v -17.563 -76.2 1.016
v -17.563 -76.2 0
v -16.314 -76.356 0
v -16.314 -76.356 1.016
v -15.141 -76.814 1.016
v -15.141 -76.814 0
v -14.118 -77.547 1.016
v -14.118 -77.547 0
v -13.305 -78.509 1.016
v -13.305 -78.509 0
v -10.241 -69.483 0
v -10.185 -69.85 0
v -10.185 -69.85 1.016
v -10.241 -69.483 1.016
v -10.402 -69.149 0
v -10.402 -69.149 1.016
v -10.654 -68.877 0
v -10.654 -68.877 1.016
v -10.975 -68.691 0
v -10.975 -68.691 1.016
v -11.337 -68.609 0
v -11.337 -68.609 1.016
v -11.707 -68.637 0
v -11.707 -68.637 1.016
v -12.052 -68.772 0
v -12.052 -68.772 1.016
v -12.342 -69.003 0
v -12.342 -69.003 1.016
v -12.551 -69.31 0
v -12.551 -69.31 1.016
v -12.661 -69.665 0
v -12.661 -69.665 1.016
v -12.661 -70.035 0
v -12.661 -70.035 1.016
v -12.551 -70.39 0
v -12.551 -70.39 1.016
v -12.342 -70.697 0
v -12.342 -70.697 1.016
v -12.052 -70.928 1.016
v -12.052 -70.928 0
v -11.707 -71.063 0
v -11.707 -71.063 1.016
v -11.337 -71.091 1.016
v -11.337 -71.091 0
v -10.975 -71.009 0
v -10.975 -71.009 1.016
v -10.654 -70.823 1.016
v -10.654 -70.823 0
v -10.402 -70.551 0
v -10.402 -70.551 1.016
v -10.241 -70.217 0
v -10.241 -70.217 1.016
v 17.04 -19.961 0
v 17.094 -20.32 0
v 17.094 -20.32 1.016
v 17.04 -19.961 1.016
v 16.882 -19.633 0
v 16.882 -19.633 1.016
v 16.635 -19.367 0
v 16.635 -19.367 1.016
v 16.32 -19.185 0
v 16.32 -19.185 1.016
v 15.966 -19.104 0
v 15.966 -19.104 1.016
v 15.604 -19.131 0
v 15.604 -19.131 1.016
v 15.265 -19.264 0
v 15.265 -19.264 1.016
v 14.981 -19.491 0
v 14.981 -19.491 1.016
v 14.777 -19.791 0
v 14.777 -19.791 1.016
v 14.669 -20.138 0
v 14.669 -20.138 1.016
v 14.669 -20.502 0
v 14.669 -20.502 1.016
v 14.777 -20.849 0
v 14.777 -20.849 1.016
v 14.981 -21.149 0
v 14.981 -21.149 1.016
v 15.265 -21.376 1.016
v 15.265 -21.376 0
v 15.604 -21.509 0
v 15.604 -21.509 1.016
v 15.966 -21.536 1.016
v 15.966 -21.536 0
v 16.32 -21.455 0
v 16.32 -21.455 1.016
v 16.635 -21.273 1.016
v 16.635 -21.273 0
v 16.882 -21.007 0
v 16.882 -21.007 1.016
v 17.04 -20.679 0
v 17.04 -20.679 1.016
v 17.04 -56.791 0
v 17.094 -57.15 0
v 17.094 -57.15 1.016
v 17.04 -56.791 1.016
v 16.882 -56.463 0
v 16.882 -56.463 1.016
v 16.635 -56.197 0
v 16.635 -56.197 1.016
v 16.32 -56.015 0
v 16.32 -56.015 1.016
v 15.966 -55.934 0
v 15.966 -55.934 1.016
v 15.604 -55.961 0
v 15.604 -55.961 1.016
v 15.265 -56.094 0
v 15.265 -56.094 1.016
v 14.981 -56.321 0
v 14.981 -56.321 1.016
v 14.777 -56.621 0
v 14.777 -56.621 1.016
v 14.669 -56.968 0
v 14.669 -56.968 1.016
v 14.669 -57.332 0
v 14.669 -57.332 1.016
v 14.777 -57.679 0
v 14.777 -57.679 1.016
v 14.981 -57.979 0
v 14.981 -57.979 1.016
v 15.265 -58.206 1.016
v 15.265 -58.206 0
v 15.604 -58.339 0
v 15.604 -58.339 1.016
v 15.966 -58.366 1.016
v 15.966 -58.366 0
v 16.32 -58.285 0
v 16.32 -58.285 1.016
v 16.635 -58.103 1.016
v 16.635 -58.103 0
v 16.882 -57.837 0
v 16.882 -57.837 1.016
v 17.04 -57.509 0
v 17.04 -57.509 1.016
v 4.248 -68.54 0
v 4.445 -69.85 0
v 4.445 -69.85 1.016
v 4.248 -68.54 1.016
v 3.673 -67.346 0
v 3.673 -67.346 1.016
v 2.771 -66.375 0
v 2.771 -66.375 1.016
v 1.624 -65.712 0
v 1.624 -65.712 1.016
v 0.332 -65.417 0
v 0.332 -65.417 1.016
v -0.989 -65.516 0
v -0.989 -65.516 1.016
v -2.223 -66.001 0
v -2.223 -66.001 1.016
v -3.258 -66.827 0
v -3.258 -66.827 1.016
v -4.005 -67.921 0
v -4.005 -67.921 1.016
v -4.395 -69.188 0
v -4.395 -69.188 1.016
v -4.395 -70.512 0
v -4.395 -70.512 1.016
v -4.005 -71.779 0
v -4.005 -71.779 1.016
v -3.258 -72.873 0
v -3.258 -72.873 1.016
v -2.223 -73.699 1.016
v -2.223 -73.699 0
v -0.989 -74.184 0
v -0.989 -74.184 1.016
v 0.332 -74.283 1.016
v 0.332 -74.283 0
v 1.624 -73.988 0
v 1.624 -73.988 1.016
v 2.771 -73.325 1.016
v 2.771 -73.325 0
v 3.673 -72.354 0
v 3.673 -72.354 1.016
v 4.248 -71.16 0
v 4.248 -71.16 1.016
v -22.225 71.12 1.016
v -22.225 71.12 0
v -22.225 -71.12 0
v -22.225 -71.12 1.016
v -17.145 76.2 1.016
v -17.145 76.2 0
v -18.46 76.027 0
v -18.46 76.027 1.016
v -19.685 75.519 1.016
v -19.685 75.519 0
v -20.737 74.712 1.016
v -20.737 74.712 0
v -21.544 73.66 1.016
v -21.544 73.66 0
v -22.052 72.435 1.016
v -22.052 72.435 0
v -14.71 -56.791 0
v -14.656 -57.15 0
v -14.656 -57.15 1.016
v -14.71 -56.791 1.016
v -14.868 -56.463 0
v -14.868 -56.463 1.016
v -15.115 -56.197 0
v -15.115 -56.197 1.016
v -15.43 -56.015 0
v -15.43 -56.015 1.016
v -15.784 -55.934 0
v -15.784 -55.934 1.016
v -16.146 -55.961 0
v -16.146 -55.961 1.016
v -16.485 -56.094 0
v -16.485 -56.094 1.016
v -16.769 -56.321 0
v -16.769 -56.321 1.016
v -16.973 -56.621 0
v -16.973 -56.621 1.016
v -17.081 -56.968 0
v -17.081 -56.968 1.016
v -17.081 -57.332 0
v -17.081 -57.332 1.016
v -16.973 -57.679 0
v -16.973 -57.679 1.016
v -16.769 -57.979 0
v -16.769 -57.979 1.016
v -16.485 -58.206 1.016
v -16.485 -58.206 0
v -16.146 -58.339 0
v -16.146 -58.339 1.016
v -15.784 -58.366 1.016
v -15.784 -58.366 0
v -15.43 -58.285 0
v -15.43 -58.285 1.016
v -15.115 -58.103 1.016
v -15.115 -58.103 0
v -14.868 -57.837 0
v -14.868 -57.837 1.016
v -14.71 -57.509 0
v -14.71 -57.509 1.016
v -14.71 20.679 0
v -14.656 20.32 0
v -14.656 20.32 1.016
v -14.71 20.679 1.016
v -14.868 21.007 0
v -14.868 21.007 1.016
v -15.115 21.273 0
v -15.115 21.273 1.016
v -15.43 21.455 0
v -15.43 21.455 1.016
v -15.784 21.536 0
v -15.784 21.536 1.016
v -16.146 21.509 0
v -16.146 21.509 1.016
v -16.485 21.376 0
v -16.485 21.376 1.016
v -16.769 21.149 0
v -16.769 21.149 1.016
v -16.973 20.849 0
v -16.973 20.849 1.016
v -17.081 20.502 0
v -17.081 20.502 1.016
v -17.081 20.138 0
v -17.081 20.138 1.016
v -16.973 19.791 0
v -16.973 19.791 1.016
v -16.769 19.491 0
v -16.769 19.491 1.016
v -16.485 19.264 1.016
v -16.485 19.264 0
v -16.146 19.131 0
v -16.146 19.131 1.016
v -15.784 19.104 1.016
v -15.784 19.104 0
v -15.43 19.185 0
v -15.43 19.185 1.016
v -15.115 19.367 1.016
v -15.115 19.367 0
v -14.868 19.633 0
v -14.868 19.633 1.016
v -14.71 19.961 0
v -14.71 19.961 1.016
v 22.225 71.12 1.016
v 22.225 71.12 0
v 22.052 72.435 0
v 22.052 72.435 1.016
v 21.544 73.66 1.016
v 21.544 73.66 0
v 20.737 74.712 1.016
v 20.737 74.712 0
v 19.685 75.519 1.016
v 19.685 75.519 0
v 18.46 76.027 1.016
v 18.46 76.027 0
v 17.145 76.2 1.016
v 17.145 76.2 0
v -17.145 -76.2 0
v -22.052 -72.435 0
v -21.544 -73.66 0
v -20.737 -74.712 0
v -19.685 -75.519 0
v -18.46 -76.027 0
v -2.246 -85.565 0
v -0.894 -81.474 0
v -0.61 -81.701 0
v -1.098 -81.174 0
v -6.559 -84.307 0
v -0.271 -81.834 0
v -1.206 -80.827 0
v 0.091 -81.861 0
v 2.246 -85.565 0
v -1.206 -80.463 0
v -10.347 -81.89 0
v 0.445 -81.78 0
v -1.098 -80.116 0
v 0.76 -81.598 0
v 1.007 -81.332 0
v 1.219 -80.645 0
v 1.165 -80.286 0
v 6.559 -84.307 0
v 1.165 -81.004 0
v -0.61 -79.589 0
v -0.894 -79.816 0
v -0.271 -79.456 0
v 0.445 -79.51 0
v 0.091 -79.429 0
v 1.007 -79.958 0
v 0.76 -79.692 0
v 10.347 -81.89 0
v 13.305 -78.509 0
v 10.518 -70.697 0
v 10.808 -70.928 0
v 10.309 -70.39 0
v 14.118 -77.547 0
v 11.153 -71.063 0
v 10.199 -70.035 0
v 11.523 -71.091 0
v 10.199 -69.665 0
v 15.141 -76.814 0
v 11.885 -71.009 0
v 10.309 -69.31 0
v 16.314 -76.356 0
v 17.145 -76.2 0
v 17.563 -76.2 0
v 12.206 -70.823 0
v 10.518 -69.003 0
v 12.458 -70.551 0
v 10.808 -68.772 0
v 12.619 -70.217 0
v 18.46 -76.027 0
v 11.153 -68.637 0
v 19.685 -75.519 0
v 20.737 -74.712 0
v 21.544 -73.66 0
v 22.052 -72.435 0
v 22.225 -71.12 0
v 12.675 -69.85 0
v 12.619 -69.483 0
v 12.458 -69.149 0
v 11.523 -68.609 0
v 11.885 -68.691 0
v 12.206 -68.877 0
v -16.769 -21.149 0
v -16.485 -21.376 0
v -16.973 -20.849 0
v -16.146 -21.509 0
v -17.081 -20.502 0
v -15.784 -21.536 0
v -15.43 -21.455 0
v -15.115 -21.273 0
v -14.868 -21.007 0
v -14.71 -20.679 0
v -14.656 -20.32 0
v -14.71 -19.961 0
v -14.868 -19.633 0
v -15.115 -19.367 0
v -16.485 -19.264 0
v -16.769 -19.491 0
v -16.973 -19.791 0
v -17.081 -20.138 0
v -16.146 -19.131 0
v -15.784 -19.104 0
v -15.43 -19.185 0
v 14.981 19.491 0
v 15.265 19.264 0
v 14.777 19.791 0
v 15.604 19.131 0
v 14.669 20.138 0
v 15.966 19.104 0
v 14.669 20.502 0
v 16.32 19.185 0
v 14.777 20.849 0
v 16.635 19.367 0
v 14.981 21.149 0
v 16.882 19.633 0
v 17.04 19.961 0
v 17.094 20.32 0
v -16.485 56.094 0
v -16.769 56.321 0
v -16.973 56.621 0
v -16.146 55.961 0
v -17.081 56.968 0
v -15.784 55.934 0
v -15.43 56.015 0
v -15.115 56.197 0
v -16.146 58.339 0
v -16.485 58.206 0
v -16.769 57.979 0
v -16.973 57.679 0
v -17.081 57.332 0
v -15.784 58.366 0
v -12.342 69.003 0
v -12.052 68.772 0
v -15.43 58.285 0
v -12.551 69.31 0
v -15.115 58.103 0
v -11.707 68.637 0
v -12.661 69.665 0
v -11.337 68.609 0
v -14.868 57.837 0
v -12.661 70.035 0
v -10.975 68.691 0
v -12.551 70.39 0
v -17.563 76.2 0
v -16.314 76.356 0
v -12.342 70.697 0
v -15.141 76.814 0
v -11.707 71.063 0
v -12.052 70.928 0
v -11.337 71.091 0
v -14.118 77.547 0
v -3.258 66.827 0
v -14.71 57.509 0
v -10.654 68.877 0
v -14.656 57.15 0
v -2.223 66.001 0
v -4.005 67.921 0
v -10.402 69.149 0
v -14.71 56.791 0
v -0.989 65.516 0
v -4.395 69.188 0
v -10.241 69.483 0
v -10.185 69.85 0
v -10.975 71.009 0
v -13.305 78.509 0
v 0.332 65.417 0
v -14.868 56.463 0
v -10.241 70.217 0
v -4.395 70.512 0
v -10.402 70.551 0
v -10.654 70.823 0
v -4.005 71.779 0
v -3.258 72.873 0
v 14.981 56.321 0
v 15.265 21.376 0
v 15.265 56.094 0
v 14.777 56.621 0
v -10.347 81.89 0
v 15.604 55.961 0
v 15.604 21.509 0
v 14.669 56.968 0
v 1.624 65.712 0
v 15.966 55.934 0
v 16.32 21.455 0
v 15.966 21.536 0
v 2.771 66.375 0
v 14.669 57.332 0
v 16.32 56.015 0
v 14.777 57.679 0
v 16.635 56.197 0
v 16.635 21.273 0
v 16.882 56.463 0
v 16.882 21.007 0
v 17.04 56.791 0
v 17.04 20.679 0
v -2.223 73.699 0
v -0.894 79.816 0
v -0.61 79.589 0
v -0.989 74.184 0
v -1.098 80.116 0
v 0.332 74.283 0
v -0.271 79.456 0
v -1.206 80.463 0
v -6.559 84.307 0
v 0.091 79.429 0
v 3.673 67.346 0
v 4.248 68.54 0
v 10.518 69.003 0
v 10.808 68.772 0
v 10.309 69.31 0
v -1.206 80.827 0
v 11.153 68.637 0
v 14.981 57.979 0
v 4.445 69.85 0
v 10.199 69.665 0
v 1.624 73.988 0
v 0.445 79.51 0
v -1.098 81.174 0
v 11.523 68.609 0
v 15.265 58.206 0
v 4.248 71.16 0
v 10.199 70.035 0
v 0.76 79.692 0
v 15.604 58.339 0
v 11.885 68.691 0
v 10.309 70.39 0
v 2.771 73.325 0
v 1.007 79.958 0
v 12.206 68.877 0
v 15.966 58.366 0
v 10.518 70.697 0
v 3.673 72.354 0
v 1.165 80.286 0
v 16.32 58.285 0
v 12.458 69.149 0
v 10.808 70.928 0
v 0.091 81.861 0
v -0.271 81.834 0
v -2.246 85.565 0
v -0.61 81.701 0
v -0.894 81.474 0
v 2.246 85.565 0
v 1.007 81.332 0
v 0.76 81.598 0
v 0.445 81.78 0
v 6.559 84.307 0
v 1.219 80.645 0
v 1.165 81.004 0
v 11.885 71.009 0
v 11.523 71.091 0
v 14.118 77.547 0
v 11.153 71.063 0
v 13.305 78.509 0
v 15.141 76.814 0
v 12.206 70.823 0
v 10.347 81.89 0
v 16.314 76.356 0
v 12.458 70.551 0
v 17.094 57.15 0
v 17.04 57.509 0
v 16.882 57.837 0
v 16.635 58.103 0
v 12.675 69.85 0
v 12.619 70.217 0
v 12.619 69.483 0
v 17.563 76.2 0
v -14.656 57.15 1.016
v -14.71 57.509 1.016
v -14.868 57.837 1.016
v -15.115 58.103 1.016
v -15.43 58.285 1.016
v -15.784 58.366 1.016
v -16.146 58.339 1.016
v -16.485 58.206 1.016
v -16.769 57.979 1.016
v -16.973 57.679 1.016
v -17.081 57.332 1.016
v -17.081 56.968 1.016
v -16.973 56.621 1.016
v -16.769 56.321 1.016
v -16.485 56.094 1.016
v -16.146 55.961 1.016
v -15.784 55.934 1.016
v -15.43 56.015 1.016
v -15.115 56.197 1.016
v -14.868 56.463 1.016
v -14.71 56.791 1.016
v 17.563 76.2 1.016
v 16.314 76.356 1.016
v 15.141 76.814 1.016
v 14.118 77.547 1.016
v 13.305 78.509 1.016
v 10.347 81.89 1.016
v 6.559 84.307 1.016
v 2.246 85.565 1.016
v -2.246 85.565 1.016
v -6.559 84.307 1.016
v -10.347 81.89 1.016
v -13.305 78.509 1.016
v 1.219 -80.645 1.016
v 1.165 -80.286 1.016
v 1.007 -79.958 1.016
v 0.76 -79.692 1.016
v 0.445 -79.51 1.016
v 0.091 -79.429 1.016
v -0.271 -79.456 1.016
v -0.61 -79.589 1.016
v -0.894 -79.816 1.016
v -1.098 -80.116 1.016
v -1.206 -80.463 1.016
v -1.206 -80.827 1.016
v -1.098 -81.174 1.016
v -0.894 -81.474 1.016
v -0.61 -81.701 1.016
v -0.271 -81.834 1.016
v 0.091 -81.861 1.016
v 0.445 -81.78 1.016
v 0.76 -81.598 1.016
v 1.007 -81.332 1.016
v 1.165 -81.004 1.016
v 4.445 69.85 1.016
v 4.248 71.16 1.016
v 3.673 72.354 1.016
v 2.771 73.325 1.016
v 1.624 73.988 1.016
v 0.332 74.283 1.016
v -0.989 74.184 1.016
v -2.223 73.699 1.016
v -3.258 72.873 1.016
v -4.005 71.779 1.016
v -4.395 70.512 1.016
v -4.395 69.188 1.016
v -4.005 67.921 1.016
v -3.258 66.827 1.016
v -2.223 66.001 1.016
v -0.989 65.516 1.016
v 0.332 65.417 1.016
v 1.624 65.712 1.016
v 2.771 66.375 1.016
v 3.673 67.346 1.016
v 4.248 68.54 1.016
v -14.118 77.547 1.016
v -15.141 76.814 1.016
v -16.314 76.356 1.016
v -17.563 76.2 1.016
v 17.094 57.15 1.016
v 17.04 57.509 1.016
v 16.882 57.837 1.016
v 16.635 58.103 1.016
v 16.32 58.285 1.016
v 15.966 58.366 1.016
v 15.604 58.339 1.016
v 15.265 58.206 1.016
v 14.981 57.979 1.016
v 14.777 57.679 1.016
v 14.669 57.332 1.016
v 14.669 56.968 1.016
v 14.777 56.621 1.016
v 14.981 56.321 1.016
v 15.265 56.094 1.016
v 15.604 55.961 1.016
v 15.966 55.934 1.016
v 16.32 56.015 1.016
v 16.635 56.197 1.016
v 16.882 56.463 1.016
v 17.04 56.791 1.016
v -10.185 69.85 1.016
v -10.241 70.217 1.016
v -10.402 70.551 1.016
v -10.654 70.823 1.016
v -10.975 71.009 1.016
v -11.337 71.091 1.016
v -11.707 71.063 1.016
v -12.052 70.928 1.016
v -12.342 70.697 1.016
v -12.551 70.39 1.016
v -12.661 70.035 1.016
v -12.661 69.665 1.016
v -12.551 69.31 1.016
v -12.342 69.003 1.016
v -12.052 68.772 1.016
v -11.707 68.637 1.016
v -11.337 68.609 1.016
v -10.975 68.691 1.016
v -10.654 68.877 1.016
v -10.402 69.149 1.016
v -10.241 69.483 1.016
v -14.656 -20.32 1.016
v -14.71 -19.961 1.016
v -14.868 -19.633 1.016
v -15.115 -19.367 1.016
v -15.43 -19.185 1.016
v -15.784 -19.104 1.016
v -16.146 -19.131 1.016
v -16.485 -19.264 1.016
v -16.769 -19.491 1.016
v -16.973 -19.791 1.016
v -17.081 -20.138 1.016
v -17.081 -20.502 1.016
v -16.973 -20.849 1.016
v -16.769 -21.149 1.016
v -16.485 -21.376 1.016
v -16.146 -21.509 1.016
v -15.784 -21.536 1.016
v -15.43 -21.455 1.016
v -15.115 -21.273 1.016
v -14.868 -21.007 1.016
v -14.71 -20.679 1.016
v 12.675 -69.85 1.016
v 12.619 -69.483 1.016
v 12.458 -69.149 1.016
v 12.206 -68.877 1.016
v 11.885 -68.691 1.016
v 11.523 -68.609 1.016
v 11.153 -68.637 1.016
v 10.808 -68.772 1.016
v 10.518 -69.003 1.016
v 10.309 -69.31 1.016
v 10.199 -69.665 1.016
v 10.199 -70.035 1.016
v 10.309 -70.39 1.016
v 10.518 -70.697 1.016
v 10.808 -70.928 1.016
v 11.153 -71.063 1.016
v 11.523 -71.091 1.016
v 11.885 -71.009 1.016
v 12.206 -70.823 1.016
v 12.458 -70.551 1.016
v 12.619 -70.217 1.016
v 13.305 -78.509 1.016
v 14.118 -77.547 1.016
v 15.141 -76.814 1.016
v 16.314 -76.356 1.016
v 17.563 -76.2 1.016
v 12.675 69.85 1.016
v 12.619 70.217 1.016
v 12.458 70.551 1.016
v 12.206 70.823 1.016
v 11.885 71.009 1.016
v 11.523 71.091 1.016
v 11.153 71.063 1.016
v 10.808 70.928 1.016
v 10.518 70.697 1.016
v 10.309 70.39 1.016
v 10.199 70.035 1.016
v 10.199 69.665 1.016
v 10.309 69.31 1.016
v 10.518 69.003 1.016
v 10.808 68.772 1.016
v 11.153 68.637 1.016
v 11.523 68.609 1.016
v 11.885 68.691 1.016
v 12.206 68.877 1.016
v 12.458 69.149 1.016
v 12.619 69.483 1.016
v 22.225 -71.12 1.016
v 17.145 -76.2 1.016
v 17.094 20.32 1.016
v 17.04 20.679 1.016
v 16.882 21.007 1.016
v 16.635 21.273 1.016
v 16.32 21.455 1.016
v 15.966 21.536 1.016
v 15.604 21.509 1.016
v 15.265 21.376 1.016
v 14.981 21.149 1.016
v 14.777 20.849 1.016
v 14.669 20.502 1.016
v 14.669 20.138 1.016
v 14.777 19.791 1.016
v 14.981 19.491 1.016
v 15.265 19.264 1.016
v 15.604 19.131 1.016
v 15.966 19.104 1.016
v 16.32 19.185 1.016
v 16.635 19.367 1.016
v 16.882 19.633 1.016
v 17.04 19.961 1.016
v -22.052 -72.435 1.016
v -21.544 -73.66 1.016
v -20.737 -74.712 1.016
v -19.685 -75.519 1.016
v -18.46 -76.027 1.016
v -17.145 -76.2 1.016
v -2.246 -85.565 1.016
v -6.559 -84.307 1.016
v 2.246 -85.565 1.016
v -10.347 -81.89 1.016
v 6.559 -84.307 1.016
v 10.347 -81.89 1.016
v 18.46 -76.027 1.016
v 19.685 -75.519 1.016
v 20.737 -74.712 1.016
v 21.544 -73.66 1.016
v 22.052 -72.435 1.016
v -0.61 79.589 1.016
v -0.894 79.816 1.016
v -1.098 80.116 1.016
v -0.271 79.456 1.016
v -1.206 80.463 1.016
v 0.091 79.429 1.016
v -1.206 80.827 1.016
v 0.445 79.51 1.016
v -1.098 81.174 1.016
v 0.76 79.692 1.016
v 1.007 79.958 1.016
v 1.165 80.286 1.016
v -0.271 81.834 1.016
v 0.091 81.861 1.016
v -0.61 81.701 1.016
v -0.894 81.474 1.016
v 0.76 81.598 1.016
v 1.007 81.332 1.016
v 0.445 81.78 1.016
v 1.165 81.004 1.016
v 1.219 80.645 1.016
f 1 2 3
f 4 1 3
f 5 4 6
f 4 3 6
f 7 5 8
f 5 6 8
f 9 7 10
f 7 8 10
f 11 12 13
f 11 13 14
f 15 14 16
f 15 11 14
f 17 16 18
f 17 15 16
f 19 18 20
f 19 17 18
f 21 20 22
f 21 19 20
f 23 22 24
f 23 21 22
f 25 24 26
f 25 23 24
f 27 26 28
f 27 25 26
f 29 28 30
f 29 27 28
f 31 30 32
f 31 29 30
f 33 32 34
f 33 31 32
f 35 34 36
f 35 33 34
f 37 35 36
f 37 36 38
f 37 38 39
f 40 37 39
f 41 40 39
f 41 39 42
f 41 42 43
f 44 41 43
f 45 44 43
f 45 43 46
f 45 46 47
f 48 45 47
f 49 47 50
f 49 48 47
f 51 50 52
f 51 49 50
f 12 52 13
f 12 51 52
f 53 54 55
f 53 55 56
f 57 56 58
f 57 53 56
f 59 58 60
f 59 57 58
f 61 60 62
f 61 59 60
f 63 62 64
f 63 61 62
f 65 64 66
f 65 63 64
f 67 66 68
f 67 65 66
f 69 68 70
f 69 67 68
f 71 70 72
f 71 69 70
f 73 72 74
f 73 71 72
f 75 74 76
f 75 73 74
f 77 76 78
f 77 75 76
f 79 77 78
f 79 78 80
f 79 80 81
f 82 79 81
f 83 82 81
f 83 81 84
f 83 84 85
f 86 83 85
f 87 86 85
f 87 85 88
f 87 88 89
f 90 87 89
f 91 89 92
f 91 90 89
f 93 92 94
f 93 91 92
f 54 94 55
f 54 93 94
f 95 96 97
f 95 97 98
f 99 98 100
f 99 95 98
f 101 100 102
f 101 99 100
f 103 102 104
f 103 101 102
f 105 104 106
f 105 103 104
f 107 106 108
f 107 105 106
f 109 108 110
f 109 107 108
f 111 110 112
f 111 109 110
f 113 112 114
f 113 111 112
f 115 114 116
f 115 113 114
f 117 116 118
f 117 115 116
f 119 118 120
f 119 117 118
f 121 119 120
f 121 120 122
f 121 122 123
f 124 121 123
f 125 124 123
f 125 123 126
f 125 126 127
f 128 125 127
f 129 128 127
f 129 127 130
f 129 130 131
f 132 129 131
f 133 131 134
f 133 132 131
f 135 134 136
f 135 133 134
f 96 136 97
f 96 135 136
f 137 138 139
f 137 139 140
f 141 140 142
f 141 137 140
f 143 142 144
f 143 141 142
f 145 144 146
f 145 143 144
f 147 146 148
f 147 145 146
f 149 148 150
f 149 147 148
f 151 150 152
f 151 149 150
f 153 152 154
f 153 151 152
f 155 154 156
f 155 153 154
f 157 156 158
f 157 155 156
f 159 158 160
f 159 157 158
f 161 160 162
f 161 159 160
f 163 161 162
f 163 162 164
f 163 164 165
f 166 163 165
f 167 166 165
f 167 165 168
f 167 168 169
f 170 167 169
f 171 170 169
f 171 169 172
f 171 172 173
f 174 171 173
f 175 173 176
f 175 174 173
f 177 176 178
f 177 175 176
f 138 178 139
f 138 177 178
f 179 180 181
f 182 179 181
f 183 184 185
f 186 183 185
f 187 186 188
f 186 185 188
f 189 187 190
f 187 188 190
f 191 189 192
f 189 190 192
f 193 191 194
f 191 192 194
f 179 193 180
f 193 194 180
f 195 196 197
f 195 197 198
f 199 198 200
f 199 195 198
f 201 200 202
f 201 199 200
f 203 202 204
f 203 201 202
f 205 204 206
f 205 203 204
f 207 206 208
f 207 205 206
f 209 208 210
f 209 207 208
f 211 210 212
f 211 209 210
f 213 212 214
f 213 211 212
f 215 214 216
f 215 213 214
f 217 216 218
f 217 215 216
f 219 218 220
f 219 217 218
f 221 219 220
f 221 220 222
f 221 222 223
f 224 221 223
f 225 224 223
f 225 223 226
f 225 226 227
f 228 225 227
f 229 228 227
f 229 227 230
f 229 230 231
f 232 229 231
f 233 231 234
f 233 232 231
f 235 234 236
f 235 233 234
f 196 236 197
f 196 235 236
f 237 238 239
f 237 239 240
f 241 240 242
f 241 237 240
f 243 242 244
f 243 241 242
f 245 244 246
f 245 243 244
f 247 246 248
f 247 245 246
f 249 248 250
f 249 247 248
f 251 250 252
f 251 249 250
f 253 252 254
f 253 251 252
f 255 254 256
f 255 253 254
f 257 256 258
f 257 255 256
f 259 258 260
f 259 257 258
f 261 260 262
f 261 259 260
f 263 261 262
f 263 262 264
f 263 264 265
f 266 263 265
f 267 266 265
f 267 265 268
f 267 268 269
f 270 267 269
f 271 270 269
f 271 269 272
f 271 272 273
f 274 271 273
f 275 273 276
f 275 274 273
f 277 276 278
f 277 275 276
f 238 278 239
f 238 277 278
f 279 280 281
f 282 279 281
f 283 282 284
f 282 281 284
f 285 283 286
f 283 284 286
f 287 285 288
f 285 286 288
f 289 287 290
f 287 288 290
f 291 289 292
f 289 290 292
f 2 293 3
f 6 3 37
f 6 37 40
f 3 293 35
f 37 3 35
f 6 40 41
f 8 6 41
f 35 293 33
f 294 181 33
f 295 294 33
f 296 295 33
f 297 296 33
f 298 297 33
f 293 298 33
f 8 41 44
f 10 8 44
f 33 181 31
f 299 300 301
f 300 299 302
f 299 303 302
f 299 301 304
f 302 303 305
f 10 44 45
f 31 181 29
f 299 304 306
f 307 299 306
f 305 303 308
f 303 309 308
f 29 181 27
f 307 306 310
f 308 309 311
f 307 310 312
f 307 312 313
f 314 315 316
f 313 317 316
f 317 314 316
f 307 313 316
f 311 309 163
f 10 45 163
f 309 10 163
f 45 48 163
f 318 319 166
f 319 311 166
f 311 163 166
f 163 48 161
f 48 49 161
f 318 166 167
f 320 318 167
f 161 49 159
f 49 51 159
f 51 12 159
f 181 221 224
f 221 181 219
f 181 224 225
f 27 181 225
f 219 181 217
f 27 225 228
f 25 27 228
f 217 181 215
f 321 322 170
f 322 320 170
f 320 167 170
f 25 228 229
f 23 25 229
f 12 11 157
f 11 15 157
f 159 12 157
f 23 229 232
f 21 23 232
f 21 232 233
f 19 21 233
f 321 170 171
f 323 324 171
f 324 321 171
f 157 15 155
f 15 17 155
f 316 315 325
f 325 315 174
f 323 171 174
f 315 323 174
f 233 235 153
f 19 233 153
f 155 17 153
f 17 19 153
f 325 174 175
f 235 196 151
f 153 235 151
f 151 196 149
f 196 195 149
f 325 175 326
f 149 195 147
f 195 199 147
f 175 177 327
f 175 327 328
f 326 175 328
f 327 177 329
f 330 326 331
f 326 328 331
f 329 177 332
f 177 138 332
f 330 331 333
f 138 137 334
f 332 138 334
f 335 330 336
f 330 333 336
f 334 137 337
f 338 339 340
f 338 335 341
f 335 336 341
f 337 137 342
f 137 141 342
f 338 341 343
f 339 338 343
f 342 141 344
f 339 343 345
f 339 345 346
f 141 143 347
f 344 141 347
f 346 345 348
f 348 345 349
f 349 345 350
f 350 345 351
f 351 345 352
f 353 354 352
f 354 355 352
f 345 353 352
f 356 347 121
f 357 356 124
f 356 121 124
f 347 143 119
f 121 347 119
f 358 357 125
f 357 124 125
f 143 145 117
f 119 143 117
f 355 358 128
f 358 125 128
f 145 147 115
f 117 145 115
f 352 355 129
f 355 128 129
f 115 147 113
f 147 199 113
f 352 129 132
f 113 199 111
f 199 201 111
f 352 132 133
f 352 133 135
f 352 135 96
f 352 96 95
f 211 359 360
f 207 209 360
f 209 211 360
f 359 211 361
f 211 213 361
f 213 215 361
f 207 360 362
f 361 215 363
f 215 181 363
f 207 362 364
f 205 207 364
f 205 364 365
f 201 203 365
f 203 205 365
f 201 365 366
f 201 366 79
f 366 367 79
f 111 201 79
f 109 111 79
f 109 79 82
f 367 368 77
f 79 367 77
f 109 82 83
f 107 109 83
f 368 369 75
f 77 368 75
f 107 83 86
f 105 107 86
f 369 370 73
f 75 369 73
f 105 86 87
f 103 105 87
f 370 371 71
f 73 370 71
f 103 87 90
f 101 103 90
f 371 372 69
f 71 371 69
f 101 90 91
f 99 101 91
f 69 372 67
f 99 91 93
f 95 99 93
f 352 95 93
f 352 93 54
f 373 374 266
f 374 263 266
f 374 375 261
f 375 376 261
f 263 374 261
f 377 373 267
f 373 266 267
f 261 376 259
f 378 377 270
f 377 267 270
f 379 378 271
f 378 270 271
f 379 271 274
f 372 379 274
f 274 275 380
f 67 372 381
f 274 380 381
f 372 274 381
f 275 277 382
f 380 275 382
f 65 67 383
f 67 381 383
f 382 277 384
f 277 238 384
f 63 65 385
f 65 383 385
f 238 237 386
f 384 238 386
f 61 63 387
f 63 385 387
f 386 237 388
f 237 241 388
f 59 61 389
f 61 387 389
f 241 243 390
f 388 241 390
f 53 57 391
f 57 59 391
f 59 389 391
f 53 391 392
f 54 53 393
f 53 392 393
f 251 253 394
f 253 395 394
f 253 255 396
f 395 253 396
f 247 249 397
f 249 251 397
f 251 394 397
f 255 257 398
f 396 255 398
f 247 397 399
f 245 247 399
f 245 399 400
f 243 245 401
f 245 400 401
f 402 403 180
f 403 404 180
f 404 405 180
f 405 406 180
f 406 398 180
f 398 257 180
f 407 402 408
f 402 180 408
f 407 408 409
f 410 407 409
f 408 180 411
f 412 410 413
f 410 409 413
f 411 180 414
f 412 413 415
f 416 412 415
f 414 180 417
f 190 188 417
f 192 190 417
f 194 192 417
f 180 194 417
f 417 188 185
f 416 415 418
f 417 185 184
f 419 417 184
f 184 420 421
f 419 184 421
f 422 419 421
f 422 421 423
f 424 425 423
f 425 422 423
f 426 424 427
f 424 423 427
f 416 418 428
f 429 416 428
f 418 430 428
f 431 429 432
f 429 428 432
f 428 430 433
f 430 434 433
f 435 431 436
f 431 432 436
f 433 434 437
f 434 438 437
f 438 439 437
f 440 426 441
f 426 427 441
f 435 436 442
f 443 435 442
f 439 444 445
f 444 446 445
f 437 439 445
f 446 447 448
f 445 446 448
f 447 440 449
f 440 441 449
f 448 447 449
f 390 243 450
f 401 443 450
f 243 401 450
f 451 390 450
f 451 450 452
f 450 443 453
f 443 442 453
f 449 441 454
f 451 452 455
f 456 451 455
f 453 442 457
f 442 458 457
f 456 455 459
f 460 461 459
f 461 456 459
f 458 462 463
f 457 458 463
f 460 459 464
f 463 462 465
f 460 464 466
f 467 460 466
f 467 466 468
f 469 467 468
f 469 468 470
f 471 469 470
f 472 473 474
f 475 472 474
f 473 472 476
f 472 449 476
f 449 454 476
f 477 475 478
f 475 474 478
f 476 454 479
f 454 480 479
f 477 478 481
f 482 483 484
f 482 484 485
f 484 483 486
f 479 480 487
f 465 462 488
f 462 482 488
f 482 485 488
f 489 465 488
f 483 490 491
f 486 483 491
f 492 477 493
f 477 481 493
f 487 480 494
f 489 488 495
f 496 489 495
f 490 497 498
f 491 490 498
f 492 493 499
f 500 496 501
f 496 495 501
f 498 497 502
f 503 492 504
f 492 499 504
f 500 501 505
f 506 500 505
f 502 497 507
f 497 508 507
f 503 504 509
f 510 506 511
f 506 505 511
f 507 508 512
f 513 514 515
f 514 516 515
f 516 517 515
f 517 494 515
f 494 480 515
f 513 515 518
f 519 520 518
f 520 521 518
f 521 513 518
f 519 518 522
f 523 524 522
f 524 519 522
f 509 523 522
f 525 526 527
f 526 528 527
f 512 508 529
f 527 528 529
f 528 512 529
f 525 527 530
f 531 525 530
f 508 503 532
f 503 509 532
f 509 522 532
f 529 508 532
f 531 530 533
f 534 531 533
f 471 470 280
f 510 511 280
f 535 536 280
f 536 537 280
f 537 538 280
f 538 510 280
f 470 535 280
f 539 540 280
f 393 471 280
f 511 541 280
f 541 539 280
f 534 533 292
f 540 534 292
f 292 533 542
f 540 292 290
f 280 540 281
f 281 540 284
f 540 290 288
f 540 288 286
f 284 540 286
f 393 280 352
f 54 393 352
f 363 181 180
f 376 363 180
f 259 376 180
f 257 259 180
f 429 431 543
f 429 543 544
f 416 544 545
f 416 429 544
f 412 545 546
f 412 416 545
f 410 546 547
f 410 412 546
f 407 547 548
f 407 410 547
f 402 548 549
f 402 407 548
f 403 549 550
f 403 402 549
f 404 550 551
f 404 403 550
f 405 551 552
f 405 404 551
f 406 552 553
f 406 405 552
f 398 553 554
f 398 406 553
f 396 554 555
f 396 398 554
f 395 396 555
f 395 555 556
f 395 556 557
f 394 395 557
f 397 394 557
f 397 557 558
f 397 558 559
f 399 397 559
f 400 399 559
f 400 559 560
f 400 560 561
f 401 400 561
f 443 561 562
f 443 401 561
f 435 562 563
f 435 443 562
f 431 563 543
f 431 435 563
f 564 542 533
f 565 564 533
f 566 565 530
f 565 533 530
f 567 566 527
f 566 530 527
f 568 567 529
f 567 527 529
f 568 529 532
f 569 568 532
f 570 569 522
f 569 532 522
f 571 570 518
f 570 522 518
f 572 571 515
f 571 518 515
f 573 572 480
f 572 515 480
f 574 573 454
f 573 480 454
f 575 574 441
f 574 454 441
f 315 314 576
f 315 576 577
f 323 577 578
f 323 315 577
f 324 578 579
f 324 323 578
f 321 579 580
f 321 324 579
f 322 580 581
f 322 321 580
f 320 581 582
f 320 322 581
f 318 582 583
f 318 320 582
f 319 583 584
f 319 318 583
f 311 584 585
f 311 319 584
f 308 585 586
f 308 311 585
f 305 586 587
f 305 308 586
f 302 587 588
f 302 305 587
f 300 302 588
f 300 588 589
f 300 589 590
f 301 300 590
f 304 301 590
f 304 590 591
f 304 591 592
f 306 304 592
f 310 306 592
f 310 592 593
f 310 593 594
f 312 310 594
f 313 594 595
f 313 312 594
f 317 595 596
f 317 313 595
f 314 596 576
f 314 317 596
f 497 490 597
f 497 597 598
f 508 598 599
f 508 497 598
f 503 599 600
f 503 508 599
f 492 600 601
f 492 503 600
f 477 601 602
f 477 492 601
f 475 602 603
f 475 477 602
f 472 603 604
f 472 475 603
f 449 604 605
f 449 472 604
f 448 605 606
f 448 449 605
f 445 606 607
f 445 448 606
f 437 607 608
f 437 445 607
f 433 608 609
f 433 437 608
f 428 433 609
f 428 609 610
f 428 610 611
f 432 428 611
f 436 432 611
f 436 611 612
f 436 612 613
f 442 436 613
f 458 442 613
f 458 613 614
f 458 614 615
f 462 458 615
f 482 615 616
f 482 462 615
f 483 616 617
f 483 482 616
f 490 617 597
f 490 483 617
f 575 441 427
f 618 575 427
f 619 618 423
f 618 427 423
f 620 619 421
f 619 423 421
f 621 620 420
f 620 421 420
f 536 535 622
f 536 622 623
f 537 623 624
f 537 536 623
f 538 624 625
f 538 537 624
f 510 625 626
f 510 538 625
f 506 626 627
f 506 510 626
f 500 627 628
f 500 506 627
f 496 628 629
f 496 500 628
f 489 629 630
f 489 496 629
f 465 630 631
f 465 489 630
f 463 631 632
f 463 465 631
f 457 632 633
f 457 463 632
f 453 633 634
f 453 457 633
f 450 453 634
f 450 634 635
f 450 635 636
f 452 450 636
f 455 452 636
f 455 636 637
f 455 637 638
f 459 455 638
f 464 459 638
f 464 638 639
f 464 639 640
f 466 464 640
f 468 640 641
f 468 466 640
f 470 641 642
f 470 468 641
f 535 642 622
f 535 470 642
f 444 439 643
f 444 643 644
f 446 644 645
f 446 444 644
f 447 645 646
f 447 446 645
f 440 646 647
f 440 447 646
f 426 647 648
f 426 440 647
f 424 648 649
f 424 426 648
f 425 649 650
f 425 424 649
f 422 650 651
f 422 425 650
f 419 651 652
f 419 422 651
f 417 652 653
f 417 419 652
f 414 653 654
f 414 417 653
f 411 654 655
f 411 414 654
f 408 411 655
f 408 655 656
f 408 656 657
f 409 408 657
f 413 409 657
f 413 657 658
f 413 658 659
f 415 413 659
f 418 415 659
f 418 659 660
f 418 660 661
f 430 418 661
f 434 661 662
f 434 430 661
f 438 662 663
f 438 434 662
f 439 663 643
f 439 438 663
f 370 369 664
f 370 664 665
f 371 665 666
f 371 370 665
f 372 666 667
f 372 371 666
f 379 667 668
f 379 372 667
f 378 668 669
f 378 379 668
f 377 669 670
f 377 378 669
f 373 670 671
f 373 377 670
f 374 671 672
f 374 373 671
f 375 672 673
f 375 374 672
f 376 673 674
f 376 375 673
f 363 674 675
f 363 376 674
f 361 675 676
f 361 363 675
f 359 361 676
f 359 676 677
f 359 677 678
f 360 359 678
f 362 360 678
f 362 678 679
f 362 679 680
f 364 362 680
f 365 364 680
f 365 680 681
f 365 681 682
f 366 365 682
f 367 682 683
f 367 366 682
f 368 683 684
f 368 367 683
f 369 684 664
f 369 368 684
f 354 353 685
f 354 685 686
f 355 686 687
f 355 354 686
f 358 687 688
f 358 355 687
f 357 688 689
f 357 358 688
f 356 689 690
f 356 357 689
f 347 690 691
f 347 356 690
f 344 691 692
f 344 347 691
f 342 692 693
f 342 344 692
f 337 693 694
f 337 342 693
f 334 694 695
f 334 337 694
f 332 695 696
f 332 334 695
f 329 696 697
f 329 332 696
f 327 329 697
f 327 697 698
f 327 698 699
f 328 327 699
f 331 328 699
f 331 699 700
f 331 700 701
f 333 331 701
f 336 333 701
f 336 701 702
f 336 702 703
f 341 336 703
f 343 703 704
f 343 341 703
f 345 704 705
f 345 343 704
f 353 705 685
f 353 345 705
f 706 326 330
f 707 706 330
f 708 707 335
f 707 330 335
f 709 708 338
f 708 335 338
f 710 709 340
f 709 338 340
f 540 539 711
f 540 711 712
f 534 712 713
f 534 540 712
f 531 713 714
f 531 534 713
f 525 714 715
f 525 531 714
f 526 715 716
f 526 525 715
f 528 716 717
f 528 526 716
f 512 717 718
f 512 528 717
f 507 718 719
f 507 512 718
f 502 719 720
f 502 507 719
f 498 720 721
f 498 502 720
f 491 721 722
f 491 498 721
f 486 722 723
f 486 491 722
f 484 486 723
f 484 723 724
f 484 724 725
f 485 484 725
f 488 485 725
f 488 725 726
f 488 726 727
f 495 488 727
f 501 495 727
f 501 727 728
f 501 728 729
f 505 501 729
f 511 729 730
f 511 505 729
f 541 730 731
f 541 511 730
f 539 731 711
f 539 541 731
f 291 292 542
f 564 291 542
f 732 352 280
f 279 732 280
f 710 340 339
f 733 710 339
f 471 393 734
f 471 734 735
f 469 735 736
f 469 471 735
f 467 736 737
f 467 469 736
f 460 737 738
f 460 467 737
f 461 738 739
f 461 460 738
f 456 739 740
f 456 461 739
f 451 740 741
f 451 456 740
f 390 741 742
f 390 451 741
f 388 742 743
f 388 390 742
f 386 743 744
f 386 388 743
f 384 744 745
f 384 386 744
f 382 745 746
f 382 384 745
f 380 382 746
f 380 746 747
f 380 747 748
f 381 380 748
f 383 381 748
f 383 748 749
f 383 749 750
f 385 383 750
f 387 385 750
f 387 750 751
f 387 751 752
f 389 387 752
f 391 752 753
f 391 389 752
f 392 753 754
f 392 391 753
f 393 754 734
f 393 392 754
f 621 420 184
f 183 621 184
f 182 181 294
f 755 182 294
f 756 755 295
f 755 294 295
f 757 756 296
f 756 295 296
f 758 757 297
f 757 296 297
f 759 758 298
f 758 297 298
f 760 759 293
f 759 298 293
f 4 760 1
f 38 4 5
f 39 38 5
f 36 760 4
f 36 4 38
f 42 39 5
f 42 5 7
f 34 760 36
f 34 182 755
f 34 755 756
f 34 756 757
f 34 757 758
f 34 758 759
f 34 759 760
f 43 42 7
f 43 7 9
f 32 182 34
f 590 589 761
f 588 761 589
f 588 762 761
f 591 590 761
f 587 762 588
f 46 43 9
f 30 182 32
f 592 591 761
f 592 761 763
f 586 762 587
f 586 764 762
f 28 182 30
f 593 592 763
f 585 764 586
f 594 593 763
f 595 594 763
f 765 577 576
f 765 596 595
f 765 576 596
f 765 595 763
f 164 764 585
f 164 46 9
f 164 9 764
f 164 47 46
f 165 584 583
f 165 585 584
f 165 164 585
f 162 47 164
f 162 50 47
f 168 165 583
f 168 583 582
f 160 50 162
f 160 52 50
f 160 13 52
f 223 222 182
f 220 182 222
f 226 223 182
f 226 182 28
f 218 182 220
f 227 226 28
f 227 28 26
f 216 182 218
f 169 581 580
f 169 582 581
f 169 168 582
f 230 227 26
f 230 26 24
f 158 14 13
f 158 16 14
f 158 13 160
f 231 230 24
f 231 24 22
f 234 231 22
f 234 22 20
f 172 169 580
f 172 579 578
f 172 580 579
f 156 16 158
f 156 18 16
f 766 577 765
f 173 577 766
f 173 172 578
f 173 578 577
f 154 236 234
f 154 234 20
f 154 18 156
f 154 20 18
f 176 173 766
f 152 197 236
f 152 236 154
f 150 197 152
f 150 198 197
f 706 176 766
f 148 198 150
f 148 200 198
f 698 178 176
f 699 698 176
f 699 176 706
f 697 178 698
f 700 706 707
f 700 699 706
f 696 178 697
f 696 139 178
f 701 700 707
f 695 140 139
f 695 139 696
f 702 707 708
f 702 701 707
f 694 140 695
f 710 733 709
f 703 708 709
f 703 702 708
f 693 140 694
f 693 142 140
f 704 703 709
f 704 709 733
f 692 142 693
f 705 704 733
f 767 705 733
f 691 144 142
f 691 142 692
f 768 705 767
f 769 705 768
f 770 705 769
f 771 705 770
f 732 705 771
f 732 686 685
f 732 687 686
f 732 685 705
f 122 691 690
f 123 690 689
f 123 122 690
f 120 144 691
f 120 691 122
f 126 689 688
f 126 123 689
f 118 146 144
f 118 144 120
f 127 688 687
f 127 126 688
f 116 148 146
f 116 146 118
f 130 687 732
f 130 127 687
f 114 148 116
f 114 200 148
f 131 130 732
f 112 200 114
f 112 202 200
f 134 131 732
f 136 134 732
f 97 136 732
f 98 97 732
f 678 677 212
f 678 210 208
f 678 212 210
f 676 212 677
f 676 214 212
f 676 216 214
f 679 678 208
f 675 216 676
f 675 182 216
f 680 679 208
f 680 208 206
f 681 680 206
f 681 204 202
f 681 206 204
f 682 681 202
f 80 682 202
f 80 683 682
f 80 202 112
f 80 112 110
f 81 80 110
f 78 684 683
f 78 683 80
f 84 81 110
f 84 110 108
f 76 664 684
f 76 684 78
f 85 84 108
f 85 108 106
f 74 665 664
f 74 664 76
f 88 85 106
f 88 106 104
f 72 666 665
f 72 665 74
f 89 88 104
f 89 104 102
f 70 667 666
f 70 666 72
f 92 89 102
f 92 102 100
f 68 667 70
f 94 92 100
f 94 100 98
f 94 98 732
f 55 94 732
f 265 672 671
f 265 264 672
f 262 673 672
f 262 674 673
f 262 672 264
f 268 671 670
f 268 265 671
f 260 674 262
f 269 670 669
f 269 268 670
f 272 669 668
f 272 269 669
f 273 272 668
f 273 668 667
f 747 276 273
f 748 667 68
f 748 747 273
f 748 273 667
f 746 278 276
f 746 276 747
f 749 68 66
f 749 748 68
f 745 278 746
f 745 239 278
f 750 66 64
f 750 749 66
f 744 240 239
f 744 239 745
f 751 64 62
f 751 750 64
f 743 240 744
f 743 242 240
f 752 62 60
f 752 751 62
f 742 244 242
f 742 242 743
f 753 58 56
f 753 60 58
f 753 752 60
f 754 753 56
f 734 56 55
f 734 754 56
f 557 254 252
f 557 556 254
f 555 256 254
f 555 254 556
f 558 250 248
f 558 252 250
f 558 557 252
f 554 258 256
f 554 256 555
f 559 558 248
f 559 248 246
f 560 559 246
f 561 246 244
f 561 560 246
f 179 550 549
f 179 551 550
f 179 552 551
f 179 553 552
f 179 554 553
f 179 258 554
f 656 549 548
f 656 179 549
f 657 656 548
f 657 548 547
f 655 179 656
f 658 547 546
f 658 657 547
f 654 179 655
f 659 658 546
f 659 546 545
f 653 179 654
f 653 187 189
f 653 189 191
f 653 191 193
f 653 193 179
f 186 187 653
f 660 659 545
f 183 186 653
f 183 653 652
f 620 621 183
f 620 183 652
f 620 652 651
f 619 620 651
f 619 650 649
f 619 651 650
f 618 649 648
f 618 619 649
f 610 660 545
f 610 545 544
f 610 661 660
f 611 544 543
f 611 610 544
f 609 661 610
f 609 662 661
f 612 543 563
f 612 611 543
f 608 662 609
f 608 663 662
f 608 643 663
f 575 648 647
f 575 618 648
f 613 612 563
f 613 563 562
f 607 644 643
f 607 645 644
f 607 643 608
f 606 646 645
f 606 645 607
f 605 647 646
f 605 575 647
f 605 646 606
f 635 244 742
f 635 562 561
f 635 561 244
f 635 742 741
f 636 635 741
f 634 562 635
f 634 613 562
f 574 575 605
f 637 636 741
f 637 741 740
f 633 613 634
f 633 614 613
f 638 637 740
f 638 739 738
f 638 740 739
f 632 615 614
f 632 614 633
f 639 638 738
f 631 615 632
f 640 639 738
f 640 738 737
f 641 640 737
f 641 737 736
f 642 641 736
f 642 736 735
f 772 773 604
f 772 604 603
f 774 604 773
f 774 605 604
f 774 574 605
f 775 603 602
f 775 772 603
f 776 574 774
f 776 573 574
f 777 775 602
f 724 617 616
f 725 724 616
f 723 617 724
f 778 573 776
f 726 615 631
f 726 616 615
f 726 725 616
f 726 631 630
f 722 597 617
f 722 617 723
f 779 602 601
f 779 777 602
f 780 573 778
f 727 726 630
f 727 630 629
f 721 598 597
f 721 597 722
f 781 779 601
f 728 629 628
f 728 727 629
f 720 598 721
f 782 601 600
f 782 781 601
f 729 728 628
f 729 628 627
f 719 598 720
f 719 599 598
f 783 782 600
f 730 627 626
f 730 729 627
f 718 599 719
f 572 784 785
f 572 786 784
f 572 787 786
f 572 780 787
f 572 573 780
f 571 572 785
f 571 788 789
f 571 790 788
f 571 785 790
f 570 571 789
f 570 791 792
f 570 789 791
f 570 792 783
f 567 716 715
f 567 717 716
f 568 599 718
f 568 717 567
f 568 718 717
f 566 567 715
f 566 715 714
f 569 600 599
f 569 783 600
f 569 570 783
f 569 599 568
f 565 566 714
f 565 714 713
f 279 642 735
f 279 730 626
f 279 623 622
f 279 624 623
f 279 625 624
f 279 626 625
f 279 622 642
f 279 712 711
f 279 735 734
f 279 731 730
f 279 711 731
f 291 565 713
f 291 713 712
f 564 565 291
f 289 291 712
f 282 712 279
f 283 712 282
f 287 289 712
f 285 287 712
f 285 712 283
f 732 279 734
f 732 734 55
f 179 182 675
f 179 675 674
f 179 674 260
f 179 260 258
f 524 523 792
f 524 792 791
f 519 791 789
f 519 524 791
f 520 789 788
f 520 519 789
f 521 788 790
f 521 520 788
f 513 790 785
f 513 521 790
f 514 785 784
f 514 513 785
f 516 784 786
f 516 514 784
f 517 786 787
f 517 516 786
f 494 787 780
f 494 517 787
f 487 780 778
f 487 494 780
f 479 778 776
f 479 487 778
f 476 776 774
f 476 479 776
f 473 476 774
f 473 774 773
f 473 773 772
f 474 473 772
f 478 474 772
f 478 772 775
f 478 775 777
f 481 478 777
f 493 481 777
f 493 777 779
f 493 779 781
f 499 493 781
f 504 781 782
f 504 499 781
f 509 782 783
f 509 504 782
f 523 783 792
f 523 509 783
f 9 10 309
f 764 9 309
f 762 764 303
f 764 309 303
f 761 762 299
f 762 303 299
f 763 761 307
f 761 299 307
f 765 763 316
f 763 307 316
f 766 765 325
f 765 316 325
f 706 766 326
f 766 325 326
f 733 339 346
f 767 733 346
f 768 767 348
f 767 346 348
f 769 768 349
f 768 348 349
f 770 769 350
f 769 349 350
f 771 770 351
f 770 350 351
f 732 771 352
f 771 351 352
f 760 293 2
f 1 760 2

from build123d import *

# Parameters (mm, degrees)
F0_R     = 1.2446
F0_R_2   = 1.2192
F0_R_3   = 4.445
F1_DEPTH = 1.016


with BuildPart() as f1:
    # F0 (on Top) → F1 (new body)
    with BuildSketch(Plane.XY):
        with BuildLine():
            ThreePointArc((13.305479, -78.509091), (15.141437, -76.814431), (17.563232, -76.2))
            Line((17.563232, -76.2), (17.145, -76.2))
            ThreePointArc((17.145, -76.2), (20.737102, -74.712102), (22.225, -71.12))
            Line((22.225, -71.12), (22.225, 71.12))
            ThreePointArc((22.225, 71.12), (20.737102, 74.712102), (17.145, 76.2))
            Line((17.145, 76.2), (17.563232, 76.2))
            ThreePointArc((17.563232, 76.2), (15.141437, 76.814431), (13.305479, 78.509091))
            ThreePointArc((13.305479, 78.509091), (0, 85.725), (-13.305479, 78.509091))
            ThreePointArc((-13.305479, 78.509091), (-15.141437, 76.814431), (-17.563232, 76.2))
            Line((-17.563232, 76.2), (-17.145, 76.2))
            ThreePointArc((-17.145, 76.2), (-20.737102, 74.712102), (-22.225, 71.12))
            Line((-22.225, 71.12), (-22.225, -71.12))
            ThreePointArc((-22.225, -71.12), (-20.737102, -74.712102), (-17.145, -76.2))
            Line((-17.145, -76.2), (-17.563232, -76.2))
            ThreePointArc((-17.563232, -76.2), (-15.141437, -76.814431), (-13.305479, -78.509091))
            ThreePointArc((-13.305479, -78.509091), (0, -85.725), (13.305479, -78.509091))
        make_face()
        with Locations((-11.43, -69.85)):
            Circle(F0_R, mode=Mode.SUBTRACT)
        with Locations((-15.875, -57.15)):
            Circle(F0_R_2, mode=Mode.SUBTRACT)
        with Locations((-15.875, -20.32)):
            Circle(F0_R_2, mode=Mode.SUBTRACT)
        with Locations((0, -80.645)):
            Circle(F0_R_2, mode=Mode.SUBTRACT)
        with Locations((0, -69.85)):
            Circle(F0_R_3, mode=Mode.SUBTRACT)
        with Locations((11.43, -69.85)):
            Circle(F0_R, mode=Mode.SUBTRACT)
        with Locations((15.875, -57.15)):
            Circle(F0_R_2, mode=Mode.SUBTRACT)
        with Locations((15.875, -20.32)):
            Circle(F0_R_2, mode=Mode.SUBTRACT)
        with Locations((-15.875, 20.32)):
            Circle(F0_R_2, mode=Mode.SUBTRACT)
        with Locations((-15.875, 57.15)):
            Circle(F0_R_2, mode=Mode.SUBTRACT)
        with Locations((-11.43, 69.85)):
            Circle(F0_R, mode=Mode.SUBTRACT)
        with Locations((15.875, 20.32)):
            Circle(F0_R_2, mode=Mode.SUBTRACT)
        with Locations((0, 69.85)):
            Circle(F0_R_3, mode=Mode.SUBTRACT)
        with Locations((0, 80.645)):
            Circle(F0_R_2, mode=Mode.SUBTRACT)
        with Locations((15.875, 57.15)):
            Circle(F0_R_2, mode=Mode.SUBTRACT)
        with Locations((11.43, 69.85)):
            Circle(F0_R, mode=Mode.SUBTRACT)
    extrude(amount=F1_DEPTH)


solid = f1.part
